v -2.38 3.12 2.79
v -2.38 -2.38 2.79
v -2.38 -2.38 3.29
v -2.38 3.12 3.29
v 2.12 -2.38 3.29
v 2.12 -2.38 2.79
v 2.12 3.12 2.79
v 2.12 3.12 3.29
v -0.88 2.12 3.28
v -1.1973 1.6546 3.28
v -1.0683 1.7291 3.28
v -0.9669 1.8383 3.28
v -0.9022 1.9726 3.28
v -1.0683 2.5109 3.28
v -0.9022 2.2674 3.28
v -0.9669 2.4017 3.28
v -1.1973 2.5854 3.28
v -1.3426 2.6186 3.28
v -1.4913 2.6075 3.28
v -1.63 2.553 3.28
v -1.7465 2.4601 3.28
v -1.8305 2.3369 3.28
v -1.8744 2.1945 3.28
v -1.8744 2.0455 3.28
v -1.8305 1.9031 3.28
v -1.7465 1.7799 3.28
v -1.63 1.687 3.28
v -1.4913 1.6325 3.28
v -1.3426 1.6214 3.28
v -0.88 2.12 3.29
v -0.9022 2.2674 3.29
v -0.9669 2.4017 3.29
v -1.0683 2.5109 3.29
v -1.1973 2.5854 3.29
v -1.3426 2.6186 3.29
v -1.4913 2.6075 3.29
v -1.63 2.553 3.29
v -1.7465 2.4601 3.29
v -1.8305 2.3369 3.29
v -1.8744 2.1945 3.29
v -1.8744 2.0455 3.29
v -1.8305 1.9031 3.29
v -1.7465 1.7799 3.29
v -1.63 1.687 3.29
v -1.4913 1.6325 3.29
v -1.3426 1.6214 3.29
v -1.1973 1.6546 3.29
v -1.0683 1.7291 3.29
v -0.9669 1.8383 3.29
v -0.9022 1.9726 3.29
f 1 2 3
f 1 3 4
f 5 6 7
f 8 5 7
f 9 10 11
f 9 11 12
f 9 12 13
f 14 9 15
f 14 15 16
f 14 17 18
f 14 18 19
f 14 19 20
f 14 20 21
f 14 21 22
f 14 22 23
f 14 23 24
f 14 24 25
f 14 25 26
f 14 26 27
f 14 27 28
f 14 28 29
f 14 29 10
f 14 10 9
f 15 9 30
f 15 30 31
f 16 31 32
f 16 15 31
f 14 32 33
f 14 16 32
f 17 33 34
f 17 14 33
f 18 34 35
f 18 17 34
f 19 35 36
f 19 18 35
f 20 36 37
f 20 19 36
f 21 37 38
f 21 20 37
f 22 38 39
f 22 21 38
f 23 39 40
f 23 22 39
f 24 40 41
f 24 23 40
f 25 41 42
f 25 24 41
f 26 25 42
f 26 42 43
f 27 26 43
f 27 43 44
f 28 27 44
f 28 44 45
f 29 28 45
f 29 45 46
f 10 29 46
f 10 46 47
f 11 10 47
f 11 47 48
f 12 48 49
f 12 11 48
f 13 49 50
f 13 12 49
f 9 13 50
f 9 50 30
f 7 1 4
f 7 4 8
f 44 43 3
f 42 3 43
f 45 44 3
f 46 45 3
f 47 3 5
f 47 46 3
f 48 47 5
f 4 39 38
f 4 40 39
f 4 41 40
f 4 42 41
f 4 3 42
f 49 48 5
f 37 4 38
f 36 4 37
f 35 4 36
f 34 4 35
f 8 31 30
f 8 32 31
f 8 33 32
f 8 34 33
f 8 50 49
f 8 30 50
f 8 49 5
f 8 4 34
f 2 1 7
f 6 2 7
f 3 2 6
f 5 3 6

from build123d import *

# Parameters (mm, degrees)
CYLINDER020_R     = 0.5
CYLINDER020_DEPTH = 0.01
BOX059_W          = 4.5
BOX059_H          = 5.5
BOX059_DEPTH      = 0.5


with BuildPart() as cylinder020:
    # Cylinder020 → Cylinder020 (new body)
    with BuildSketch(Plane(origin=(1, 4.5, 0.49), x_dir=(1, 0, 0), z_dir=(0, 0, 1))):
        Circle(CYLINDER020_R)
    extrude(amount=CYLINDER020_DEPTH)


with BuildPart() as small_linbo3_plate017:
    # Box059 → Box059 (new body)
    with BuildSketch(Plane.XY):
        with Locations((2.25, 2.75)):
            Rectangle(BOX059_W, BOX059_H)
    extrude(amount=BOX059_DEPTH)

    # Cut010: cut Cylinder020
    add(cylinder020.part, mode=Mode.SUBTRACT)


with BuildPart() as small_linbo3_plate017_1:
    # Cut010 placement: moved
    add(small_linbo3_plate017.part.moved(Location((-2.38, -2.38, 2.79))))


solid = small_linbo3_plate017_1.part
